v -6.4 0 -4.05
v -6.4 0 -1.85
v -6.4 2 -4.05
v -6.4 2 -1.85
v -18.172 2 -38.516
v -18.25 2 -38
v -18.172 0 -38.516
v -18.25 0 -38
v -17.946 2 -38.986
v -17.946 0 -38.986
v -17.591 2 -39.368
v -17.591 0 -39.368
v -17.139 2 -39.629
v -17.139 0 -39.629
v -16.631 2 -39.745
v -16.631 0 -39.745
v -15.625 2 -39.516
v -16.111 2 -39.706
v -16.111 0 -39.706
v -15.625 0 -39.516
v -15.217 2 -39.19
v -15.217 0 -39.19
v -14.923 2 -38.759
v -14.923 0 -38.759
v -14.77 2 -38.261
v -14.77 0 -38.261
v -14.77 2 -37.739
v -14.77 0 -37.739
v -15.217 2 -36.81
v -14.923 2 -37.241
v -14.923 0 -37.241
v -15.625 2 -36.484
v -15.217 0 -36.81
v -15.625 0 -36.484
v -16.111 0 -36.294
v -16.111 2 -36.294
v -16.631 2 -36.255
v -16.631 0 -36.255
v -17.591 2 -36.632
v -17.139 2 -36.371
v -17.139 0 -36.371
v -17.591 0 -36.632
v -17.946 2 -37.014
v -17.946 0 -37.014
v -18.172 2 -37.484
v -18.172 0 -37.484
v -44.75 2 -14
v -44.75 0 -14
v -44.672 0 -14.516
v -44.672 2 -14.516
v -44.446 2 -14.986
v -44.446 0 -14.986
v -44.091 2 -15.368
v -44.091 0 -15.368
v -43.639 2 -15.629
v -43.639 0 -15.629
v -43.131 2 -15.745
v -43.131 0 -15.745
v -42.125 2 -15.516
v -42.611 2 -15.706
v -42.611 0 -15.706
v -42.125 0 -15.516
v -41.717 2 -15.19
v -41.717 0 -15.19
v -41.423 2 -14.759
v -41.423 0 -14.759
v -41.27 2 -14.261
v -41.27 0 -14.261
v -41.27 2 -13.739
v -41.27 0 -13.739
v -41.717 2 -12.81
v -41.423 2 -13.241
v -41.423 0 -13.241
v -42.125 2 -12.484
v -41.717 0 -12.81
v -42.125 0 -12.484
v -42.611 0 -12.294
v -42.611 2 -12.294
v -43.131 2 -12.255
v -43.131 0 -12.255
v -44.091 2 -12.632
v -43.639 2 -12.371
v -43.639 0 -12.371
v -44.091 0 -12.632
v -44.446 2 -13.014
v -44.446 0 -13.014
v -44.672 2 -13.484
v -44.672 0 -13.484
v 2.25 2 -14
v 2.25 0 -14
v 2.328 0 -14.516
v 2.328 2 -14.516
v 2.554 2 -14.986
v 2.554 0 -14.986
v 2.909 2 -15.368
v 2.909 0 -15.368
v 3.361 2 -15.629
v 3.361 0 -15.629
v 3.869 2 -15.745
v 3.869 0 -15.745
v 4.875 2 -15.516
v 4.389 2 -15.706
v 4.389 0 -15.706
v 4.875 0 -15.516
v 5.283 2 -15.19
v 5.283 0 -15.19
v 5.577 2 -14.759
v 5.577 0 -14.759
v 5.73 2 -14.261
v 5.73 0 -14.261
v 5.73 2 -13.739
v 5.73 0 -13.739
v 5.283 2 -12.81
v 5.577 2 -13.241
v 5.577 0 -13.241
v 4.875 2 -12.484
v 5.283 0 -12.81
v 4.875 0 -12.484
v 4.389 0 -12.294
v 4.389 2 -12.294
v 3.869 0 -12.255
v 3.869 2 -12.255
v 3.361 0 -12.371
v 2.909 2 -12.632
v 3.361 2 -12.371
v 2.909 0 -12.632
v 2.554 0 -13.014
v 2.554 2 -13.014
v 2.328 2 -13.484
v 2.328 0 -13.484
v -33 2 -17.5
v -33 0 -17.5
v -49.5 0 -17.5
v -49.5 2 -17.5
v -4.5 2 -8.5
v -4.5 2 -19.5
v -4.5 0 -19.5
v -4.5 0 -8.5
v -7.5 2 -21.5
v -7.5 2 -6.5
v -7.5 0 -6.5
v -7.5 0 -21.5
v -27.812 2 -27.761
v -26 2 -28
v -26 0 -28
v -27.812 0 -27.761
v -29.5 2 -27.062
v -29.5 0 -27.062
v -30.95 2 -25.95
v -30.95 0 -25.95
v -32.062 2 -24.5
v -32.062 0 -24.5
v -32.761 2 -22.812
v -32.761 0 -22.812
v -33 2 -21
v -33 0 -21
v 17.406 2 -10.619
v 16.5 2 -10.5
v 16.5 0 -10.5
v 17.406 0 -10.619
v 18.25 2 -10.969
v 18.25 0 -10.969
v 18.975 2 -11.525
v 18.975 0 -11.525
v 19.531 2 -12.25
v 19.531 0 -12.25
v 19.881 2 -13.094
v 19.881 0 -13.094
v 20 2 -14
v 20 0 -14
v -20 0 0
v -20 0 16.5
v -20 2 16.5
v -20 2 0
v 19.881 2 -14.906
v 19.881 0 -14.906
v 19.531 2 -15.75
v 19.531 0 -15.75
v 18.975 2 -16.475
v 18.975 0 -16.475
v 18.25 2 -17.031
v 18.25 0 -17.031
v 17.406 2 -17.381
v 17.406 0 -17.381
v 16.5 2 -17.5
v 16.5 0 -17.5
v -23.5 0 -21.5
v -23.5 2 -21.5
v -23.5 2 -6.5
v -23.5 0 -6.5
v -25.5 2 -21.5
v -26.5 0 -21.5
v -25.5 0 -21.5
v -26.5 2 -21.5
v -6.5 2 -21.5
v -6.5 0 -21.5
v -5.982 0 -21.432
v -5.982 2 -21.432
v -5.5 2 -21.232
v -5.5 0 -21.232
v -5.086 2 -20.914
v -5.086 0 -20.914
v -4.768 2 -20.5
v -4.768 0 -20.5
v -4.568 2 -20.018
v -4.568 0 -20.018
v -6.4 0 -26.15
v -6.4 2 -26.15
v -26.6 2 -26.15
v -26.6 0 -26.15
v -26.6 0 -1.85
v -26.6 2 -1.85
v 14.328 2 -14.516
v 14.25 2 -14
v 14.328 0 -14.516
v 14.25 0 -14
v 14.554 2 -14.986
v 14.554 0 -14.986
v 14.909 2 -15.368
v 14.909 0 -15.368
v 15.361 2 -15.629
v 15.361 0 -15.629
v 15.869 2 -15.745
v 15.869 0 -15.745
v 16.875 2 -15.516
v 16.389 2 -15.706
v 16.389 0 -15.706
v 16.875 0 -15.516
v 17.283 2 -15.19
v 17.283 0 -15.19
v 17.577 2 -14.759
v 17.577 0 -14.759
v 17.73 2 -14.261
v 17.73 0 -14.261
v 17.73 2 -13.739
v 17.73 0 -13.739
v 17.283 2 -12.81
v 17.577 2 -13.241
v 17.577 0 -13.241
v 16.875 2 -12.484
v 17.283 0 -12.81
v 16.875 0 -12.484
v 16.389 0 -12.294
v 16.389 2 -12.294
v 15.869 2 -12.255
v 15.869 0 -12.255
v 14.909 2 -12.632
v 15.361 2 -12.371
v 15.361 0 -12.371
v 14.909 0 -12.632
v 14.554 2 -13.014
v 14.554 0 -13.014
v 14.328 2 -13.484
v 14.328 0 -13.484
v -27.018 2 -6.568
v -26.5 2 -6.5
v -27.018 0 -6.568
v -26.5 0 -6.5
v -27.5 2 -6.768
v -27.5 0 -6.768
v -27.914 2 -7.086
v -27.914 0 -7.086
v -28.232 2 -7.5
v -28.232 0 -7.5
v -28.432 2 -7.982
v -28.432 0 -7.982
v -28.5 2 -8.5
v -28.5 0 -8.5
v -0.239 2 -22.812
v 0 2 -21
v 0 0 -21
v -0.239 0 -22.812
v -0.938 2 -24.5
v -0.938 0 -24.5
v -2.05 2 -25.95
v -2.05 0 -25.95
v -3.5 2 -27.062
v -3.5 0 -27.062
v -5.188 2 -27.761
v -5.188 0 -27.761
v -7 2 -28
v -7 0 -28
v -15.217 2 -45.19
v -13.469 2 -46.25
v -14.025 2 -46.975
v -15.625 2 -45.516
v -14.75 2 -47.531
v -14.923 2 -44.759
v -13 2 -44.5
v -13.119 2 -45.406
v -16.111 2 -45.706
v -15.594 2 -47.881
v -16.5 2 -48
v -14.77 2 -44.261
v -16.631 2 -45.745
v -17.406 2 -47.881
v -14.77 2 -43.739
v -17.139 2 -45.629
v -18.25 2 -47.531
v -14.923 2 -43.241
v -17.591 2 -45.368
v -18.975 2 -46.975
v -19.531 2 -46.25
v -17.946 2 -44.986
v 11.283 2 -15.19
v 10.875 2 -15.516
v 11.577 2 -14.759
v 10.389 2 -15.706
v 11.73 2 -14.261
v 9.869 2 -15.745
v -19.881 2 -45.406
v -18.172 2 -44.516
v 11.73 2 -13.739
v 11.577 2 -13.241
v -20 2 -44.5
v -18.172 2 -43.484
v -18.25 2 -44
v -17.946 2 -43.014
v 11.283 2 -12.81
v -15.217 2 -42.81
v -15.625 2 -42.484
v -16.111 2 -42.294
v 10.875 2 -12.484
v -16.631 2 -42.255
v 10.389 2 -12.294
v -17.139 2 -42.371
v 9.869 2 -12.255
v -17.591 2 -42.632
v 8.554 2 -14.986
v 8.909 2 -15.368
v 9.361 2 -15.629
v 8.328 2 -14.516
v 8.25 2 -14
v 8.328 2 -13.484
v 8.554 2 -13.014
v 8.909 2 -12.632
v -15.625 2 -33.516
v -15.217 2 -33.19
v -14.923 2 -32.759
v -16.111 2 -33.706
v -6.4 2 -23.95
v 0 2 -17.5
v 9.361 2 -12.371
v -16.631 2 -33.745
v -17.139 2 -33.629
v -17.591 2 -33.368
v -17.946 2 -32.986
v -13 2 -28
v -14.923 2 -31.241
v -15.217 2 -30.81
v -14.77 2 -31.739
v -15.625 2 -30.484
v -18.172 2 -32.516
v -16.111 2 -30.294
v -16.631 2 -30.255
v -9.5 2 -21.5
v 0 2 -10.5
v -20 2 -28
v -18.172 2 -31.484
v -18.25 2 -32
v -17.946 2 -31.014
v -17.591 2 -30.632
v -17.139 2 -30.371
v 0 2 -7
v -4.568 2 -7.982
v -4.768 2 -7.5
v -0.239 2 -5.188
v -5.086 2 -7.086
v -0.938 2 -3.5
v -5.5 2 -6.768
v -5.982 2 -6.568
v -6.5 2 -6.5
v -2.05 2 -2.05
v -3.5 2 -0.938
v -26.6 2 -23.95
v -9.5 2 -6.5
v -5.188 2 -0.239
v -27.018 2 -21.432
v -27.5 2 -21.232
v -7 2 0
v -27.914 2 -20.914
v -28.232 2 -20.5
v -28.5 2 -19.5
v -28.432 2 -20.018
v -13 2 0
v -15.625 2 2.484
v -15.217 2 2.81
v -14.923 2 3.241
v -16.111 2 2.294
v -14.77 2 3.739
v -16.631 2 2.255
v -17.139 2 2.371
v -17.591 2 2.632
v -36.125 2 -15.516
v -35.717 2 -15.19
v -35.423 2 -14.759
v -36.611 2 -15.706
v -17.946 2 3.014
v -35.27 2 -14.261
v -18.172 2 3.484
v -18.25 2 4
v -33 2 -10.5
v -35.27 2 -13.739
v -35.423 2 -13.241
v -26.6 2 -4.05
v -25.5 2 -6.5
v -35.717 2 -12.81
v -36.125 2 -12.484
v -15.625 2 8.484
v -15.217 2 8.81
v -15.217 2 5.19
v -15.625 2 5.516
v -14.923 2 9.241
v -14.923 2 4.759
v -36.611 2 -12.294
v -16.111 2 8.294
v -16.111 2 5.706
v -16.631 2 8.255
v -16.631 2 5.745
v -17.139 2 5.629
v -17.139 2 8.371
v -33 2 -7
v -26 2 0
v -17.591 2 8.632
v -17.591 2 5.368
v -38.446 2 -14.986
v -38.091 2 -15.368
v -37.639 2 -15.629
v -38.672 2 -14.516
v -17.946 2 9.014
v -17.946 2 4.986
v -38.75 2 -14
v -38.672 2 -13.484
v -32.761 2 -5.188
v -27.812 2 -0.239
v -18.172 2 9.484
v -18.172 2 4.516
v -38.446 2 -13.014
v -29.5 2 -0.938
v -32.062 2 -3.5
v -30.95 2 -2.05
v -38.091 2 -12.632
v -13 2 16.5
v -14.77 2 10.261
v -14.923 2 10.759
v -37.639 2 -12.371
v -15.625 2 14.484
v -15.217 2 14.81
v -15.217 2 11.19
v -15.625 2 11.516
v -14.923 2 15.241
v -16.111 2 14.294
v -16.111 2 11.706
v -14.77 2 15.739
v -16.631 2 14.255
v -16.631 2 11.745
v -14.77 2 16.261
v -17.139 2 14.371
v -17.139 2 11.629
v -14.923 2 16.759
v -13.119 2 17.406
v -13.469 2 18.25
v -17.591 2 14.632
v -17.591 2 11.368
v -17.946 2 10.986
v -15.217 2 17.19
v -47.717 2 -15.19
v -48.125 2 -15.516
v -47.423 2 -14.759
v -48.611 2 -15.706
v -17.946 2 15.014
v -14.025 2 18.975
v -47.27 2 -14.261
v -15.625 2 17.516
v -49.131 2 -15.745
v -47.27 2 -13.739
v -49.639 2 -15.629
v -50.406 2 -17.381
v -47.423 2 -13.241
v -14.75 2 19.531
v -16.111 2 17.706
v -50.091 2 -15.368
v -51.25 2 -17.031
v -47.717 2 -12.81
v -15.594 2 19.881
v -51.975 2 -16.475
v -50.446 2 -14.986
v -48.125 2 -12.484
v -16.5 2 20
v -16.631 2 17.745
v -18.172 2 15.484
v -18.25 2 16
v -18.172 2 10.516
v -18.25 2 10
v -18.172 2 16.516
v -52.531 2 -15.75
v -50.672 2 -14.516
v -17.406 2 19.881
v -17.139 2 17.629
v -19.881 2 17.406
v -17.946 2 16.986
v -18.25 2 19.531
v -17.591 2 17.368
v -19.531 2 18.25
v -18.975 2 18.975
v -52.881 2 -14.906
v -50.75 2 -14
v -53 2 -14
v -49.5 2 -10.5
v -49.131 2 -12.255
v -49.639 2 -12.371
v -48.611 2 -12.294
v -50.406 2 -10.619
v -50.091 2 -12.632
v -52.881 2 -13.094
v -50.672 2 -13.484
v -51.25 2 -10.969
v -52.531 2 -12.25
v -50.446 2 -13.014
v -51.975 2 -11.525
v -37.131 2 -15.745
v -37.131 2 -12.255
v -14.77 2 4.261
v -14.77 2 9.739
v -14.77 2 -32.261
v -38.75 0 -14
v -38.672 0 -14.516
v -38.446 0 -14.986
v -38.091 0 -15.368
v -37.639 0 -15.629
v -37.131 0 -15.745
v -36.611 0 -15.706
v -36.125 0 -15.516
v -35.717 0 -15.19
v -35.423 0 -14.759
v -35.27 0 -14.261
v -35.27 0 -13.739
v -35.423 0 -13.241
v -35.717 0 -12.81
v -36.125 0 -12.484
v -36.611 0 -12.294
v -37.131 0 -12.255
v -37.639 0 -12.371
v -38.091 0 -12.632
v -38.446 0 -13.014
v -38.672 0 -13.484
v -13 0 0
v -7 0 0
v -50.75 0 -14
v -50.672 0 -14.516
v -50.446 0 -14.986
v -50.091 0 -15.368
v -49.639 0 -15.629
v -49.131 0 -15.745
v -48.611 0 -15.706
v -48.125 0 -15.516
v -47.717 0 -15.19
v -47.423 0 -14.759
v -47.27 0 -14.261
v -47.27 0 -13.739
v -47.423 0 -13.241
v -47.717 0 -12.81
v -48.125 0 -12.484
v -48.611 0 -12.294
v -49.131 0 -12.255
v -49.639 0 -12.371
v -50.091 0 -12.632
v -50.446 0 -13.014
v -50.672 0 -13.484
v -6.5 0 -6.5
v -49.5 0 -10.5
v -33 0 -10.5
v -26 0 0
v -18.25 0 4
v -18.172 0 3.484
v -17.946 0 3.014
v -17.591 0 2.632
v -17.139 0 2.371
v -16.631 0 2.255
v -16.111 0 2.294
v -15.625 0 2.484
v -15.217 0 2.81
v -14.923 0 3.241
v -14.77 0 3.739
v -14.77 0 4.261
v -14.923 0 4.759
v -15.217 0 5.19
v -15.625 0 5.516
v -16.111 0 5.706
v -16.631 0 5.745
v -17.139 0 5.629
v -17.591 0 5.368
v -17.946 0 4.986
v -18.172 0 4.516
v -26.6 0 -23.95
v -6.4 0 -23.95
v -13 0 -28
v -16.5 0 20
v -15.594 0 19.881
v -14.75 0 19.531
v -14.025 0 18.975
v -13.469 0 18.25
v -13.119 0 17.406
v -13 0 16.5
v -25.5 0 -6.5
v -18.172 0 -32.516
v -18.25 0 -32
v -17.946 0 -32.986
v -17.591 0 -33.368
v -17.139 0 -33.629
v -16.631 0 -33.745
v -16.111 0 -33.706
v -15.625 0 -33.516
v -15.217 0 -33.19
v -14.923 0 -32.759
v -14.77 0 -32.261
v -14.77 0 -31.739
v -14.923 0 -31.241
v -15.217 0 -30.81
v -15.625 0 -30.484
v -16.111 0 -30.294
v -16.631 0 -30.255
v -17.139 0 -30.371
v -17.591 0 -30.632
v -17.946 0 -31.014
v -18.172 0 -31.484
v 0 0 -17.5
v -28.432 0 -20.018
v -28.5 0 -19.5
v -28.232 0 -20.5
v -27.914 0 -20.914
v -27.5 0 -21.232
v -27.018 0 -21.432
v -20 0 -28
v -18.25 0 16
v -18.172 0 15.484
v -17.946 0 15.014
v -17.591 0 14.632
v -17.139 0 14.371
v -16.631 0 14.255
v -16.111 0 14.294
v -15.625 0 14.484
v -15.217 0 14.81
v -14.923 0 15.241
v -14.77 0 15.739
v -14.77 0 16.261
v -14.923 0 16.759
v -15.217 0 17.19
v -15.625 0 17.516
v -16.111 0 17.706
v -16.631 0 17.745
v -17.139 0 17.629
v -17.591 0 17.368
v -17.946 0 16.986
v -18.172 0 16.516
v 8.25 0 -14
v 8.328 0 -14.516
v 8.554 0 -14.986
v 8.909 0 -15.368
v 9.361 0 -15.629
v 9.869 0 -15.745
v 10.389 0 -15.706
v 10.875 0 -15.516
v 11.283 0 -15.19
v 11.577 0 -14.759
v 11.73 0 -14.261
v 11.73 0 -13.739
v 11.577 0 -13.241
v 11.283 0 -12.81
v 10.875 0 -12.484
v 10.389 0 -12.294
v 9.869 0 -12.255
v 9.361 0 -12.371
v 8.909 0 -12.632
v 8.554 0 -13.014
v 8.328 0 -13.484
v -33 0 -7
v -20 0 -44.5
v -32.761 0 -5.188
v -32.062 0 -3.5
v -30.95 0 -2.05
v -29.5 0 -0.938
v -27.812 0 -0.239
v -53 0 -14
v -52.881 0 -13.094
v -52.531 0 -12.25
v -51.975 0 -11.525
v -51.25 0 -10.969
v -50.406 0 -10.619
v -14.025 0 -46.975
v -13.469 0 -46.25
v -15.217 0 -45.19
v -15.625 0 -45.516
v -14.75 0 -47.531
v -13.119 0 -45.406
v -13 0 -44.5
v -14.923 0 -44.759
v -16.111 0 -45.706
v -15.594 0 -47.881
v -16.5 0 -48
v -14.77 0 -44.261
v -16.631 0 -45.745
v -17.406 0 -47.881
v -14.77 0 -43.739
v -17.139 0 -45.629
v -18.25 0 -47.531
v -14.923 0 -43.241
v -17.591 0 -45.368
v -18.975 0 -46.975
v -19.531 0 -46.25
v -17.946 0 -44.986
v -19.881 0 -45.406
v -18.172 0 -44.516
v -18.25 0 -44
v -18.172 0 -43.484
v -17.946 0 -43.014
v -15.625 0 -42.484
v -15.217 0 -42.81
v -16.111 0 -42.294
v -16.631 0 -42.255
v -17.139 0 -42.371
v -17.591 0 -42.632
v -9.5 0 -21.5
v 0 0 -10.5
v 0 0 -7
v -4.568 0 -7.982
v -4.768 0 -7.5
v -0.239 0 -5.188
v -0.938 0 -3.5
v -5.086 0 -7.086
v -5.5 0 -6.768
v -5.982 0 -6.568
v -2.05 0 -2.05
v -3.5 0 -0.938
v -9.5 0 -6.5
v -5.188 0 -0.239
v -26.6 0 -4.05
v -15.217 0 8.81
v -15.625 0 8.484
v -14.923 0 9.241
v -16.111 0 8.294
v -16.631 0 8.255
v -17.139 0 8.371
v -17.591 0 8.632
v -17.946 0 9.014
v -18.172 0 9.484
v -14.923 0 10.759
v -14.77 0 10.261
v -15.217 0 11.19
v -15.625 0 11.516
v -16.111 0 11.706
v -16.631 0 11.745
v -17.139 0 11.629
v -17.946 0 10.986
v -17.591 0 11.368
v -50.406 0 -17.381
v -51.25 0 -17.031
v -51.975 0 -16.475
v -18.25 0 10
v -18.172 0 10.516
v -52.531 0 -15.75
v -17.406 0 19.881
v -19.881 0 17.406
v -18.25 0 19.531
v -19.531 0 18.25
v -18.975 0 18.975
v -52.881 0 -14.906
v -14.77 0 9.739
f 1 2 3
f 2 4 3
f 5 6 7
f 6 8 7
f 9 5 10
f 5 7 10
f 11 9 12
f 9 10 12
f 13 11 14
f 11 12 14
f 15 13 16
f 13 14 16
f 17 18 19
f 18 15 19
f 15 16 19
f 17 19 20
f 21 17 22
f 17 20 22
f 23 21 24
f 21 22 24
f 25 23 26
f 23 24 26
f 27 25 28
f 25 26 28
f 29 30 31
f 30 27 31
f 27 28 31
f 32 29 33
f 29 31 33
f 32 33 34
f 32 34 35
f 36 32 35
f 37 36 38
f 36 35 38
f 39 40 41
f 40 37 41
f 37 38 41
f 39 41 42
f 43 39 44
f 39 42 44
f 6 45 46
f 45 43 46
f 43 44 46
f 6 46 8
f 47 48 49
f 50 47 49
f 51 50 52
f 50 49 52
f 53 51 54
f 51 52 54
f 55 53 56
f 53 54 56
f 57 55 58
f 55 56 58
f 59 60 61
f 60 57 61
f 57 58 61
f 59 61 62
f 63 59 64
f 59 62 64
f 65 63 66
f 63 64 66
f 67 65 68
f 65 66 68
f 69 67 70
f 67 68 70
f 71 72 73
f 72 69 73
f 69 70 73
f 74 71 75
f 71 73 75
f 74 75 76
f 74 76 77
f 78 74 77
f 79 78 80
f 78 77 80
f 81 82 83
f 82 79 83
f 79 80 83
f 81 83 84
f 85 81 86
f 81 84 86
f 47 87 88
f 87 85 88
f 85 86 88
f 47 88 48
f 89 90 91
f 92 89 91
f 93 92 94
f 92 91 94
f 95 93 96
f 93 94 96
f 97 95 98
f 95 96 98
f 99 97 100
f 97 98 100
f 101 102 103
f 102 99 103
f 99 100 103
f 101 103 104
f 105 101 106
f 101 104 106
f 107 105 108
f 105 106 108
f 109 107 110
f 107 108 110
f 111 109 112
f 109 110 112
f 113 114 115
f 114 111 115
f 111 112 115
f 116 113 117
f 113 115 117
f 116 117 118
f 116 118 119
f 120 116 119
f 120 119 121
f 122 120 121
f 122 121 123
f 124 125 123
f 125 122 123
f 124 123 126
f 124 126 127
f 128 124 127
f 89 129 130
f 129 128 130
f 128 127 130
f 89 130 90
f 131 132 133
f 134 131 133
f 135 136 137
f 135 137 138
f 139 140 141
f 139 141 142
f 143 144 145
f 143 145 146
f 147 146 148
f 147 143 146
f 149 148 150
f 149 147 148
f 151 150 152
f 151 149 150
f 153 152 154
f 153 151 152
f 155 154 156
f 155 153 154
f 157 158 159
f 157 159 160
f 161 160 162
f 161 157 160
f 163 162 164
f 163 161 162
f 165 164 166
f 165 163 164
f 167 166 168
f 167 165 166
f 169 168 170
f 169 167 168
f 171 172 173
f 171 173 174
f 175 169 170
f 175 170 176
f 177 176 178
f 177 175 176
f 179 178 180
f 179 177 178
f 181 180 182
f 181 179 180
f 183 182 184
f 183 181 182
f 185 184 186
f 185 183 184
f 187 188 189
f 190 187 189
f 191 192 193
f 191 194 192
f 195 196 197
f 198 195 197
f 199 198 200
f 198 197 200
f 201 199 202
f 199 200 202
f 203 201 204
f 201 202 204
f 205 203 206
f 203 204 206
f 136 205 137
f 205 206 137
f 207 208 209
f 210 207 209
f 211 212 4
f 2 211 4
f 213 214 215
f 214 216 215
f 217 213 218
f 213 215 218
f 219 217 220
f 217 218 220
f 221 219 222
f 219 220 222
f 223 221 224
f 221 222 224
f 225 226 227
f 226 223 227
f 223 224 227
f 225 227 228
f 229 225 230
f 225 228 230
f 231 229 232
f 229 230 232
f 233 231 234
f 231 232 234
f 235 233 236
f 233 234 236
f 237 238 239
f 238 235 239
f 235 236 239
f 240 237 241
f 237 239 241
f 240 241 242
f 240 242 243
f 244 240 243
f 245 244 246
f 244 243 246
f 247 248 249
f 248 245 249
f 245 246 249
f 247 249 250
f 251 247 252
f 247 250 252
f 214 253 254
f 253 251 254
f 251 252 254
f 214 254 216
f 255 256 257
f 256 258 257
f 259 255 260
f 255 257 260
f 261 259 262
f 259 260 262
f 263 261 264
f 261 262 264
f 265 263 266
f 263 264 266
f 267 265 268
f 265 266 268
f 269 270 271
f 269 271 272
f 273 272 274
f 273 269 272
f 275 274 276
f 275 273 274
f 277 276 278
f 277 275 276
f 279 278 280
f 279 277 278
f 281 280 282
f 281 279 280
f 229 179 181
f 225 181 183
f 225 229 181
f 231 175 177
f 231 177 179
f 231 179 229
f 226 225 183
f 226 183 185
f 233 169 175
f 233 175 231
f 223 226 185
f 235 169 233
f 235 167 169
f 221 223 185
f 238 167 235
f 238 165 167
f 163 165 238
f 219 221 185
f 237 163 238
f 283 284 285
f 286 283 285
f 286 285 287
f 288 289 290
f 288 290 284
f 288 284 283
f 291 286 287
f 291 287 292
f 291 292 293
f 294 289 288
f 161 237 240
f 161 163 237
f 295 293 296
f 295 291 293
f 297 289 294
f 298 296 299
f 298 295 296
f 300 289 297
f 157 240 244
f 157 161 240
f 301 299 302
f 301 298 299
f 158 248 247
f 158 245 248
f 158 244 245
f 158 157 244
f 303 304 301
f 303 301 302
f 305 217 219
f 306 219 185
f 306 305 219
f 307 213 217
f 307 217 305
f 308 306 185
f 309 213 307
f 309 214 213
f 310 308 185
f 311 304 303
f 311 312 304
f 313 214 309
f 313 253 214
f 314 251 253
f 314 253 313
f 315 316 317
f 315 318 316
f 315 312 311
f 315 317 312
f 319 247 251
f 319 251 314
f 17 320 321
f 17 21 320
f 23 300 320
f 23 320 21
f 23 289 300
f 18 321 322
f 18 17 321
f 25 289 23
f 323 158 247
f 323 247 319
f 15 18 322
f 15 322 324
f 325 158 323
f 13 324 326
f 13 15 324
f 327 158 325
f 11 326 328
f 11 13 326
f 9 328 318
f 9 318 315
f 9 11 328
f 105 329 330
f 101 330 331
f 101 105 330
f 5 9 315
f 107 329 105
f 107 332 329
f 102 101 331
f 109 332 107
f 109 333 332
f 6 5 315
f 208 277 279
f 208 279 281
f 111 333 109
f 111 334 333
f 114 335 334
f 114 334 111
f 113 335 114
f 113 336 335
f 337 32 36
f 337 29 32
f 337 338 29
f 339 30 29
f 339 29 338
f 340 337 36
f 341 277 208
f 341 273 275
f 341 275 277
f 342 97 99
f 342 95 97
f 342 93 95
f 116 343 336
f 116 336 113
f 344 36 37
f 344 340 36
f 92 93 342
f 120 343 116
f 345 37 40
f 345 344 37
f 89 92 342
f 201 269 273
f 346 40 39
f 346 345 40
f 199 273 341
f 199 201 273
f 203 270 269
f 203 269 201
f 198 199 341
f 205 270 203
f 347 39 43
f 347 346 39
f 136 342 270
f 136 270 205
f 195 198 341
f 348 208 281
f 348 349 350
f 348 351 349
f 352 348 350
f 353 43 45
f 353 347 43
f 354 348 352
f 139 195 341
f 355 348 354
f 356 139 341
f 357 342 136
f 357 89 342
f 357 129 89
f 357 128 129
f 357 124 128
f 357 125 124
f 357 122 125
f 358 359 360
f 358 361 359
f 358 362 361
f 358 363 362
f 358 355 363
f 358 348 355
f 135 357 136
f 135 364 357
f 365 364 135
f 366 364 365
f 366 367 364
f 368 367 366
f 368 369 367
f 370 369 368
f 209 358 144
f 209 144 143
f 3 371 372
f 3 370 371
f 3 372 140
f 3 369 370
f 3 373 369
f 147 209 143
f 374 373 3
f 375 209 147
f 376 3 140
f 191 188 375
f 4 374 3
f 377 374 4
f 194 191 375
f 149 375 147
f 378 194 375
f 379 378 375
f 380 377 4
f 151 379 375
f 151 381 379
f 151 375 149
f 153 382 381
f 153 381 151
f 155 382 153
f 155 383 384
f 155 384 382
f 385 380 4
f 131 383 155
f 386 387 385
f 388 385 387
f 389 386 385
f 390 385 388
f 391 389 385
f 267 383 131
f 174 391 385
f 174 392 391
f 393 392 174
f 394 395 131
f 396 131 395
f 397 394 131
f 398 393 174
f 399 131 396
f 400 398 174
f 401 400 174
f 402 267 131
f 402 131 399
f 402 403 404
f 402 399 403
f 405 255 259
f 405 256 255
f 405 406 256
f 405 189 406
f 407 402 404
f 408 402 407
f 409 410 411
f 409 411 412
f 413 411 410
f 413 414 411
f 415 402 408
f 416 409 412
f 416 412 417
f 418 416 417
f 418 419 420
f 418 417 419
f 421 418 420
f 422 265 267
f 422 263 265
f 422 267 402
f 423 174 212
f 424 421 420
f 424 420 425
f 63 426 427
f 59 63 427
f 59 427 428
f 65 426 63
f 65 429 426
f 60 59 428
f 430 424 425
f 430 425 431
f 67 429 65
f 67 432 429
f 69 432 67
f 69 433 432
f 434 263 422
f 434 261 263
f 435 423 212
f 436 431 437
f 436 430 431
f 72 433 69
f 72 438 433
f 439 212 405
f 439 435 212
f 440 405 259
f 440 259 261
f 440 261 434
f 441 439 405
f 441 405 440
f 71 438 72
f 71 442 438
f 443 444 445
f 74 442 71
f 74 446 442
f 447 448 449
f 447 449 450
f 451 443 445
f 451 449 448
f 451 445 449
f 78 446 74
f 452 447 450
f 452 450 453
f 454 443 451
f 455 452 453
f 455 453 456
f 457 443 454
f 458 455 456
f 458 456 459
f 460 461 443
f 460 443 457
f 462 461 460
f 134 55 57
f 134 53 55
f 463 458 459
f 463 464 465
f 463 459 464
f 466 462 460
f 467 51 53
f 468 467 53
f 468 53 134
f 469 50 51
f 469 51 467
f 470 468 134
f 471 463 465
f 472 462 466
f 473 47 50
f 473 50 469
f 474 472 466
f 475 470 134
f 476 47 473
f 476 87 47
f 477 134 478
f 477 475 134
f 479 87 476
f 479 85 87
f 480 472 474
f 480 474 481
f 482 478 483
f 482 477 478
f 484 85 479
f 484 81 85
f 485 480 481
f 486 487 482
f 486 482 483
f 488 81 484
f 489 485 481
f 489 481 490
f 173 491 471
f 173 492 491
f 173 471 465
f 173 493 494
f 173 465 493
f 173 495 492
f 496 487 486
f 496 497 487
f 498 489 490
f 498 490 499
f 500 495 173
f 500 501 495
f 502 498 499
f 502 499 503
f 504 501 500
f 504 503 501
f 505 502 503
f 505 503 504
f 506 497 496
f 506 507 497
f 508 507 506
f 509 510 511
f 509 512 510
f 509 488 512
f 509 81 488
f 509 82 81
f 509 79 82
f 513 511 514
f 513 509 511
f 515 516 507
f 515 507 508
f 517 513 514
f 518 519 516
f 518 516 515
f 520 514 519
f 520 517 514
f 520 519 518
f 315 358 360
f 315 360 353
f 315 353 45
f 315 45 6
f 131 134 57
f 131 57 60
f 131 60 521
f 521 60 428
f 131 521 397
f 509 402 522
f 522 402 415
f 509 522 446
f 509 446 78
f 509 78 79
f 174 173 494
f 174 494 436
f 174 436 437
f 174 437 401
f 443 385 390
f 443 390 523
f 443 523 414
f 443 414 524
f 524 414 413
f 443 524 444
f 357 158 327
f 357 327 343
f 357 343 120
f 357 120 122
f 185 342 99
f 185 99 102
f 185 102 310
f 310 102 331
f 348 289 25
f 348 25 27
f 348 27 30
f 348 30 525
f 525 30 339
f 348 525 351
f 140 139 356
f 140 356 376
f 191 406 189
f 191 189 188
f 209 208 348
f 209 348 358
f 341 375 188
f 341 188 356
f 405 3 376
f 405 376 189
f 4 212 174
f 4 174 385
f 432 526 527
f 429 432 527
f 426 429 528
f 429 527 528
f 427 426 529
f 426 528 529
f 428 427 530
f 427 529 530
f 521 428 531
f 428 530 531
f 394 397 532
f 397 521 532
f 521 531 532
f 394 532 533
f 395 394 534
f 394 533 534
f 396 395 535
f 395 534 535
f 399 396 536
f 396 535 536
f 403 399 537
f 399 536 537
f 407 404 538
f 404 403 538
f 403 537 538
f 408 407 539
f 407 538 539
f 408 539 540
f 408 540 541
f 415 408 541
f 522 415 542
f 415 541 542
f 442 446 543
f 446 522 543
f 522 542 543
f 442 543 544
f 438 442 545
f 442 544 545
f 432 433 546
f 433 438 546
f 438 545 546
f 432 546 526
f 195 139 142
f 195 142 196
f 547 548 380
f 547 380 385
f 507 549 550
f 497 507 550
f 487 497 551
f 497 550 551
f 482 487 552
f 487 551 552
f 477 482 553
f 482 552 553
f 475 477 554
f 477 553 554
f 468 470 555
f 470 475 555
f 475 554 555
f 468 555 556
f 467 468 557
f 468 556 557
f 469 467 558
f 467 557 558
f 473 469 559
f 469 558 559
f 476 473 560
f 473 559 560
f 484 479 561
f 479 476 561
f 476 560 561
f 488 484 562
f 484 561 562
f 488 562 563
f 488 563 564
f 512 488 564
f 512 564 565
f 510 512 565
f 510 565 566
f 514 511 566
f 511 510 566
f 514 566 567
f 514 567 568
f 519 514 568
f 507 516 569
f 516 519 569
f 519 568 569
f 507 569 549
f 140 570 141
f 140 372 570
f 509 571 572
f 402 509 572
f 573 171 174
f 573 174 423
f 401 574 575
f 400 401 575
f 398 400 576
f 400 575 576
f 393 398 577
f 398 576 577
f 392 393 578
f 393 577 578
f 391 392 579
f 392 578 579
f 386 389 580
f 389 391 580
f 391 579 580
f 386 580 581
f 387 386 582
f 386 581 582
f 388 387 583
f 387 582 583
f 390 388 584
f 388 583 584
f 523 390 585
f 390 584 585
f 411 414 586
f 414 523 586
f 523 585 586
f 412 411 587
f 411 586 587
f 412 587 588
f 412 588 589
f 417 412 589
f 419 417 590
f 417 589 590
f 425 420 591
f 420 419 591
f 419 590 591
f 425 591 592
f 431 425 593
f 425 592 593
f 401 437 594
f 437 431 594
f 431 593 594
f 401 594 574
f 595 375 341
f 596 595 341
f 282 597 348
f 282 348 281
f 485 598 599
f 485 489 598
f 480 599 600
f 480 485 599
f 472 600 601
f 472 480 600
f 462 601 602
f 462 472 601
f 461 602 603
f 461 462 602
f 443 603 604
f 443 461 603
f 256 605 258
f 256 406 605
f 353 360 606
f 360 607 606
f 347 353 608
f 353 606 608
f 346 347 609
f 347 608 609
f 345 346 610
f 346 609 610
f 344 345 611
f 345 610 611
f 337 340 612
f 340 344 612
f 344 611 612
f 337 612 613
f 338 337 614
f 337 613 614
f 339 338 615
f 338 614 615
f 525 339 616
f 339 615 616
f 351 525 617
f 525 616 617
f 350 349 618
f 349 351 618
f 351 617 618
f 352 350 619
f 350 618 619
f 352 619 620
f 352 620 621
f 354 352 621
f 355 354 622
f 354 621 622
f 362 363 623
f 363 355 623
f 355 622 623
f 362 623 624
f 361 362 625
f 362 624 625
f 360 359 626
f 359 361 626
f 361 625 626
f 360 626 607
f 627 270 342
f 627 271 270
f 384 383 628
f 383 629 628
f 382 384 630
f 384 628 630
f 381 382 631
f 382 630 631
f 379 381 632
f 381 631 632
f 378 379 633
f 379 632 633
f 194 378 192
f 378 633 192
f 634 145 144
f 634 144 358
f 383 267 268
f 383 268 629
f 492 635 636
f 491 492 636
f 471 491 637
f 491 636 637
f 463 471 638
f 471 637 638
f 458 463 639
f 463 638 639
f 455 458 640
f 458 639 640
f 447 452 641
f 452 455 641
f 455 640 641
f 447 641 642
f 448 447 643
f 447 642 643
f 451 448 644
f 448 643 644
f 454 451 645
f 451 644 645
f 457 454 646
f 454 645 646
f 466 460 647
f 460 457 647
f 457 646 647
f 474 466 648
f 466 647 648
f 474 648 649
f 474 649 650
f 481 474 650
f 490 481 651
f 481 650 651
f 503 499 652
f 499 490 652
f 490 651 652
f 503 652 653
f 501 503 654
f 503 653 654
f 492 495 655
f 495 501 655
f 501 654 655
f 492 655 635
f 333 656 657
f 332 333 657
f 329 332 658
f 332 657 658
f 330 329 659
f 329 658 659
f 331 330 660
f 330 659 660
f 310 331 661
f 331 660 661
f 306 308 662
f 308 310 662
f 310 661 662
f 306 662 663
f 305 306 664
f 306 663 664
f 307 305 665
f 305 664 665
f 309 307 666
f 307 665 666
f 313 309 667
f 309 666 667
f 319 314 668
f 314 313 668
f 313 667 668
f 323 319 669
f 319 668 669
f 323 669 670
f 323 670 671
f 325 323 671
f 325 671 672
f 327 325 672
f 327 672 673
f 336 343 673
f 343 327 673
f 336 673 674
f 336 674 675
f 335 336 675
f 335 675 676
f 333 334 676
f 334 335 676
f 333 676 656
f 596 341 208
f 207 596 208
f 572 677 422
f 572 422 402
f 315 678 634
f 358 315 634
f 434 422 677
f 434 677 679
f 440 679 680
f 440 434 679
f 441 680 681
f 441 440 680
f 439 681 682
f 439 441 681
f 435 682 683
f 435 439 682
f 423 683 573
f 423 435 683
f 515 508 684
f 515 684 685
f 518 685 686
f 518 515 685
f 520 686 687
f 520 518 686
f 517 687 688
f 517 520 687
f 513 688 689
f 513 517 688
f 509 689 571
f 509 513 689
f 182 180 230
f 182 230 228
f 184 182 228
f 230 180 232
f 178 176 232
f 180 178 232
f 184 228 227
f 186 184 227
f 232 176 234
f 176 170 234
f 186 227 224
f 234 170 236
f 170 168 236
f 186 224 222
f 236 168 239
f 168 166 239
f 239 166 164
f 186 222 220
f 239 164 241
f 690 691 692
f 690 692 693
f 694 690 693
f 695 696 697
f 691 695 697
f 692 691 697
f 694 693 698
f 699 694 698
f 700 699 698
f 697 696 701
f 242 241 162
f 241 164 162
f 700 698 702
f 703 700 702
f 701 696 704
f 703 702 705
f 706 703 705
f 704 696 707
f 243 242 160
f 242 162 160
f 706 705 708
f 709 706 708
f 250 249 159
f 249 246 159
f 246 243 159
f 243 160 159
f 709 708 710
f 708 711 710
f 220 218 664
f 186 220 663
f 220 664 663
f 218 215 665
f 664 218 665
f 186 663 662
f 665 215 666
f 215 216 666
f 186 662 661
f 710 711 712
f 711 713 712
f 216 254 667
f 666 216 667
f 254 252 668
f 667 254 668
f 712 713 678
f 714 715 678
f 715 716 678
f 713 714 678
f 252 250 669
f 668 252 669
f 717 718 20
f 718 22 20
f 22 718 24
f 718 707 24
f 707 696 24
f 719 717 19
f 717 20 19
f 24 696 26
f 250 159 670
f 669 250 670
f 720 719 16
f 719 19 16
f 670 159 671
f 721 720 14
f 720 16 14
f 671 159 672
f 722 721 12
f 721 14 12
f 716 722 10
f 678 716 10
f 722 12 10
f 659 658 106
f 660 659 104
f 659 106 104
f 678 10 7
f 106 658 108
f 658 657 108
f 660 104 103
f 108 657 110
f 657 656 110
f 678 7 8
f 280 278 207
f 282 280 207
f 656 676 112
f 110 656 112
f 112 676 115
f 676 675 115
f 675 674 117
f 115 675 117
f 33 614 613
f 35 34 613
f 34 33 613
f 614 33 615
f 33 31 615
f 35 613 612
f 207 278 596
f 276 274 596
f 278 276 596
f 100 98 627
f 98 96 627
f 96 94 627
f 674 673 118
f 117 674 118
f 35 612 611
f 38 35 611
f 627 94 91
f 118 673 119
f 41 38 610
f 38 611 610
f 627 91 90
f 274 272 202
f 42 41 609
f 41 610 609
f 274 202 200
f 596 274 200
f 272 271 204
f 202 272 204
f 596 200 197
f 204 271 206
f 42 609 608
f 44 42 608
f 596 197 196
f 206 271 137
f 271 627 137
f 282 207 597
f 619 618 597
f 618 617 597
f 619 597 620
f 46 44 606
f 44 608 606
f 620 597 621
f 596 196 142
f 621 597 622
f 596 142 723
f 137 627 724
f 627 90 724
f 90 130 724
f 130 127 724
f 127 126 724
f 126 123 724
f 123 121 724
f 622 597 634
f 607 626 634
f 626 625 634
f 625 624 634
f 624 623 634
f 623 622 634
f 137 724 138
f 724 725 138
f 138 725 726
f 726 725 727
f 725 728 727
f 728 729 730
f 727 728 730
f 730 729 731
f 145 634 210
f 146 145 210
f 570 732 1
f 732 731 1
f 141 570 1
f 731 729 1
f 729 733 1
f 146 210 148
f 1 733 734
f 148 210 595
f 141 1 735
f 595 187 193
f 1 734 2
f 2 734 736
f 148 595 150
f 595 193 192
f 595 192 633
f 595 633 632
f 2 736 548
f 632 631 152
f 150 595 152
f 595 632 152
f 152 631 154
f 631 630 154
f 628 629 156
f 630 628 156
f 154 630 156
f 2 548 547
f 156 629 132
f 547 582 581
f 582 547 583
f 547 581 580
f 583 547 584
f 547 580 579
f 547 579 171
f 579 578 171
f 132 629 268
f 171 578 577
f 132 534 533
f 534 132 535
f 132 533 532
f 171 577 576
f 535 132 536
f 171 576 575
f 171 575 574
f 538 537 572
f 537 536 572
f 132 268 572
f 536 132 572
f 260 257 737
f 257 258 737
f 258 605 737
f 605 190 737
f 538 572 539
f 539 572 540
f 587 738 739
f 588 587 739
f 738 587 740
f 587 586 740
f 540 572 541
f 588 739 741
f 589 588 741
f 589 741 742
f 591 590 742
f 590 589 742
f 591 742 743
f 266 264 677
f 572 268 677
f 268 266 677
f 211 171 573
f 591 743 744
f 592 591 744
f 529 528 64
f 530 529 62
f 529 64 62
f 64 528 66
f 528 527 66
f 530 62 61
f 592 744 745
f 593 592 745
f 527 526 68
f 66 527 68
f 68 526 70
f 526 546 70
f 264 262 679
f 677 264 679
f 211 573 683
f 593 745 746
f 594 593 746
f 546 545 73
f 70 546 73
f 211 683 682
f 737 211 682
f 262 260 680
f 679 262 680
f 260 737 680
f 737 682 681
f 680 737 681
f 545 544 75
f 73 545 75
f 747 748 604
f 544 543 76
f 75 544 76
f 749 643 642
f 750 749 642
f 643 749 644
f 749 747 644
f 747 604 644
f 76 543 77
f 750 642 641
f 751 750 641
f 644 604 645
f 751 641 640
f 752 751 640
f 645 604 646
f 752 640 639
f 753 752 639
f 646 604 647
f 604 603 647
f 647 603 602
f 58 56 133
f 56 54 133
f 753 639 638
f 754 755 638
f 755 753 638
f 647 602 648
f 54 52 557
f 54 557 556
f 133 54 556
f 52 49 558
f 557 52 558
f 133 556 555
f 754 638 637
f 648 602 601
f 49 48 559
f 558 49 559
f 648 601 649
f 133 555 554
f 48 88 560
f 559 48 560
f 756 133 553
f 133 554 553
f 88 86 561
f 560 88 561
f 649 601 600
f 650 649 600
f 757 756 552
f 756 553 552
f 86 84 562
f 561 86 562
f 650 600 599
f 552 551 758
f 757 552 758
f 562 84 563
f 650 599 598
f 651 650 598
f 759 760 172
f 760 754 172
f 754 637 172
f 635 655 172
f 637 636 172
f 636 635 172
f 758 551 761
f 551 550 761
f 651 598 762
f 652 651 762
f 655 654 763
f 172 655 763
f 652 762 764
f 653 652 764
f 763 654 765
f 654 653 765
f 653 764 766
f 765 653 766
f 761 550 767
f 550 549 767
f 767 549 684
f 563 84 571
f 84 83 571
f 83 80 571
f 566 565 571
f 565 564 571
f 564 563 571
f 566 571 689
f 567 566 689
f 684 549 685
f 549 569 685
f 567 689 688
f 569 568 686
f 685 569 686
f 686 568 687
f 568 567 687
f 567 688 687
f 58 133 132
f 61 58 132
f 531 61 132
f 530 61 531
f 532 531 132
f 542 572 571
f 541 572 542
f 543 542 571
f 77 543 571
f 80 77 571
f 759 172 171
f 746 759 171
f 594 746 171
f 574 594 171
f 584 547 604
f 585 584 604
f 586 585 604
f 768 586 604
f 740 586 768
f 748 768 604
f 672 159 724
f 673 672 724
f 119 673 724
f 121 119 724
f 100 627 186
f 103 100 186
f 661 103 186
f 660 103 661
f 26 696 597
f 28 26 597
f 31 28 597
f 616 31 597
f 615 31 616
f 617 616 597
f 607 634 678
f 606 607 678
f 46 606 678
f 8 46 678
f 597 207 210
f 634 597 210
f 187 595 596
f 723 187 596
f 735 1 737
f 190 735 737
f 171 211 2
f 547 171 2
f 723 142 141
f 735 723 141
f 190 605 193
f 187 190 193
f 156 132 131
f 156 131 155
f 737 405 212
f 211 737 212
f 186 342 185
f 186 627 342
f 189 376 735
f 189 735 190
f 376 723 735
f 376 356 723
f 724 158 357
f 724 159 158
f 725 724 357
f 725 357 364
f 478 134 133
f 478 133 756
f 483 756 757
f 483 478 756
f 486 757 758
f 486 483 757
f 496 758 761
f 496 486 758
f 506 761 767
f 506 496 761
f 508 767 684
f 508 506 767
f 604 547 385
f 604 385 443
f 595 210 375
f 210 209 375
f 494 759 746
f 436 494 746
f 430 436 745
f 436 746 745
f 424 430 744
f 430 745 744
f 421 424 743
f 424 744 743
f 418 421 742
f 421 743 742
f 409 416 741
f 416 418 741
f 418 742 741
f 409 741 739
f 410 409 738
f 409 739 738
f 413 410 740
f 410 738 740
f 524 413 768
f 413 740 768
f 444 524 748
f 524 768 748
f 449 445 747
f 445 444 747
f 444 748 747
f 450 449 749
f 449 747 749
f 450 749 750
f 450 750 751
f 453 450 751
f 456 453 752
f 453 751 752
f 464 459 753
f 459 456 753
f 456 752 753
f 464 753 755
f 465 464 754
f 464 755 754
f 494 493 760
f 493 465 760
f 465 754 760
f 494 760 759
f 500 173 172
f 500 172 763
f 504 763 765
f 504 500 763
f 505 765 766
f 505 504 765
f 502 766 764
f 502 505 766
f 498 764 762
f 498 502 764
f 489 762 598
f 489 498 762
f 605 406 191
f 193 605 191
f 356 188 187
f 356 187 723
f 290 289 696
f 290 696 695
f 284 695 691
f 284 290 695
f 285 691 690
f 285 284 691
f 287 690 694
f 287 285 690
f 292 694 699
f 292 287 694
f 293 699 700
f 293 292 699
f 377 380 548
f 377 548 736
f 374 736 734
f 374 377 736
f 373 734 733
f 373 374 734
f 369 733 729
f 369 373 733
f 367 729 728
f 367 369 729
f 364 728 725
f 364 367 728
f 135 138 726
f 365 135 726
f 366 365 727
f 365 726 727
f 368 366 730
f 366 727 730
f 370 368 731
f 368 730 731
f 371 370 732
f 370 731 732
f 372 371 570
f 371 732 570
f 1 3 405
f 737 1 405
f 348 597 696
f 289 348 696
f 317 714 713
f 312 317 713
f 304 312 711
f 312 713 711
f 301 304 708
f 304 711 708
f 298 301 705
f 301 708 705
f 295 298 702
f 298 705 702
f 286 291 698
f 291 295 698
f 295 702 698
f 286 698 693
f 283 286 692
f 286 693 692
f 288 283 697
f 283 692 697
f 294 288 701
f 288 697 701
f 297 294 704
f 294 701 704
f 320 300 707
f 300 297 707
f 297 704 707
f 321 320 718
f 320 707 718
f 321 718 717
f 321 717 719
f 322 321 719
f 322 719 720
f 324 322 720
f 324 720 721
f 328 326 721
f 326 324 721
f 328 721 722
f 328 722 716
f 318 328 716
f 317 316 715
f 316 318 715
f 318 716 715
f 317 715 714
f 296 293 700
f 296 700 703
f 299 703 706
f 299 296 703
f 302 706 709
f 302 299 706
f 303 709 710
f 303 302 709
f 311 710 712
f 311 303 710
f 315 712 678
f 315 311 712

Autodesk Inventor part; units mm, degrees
ref_plane "YZ Plane" through (0, 0, 0) normal (1, 0, 0) x (0, 1, 0)
ref_plane "XZ Plane" through (0, 0, 0) normal (0, 1, 0) x (-1, 0, 0)
ref_plane "XY Plane" through (0, 0, 0) normal (0, 0, 1) x (1, 0, 0)
sketch "Sketch1" plane through (0, 0, 0) normal (0, 1, 0) x (-1, 0, 0)
  line L0 (0, 0) -> (33, 0)
  line L1 (33, 0) -> (33, -28)
  line L2 (33, -28) -> (0, -28)
  line L3 (0, -28) -> (0, 0)
  line L4 (0, -17.5) -> (-20, -17.5)
  line L5 (-20, -17.5) -> (-20, -10.5)
  line L6 (-20, -10.5) -> (0, -10.5)
  line L7 (0, -10.5) -> (0, -17.5)
  line L8 (33, -17.5) -> (53, -17.5)
  line L9 (53, -17.5) -> (53, -10.5)
  line L10 (53, -10.5) -> (33, -10.5)
  line L11 (33, -10.5) -> (33, -17.5)
  line L12 (20, -28) -> (13, -28)
  line L13 (13, -28) -> (13, -48)
  line L14 (13, -48) -> (20, -48)
  line L15 (20, -48) -> (20, -28)
  line L16 (20, 0) -> (13, 0)
  line L17 (13, 0) -> (13, 20)
  line L18 (13, 20) -> (20, 20)
  line L19 (20, 20) -> (20, 0)
  circle A0 centre (16.5, -44) radius 1.75
  circle A1 centre (-16, -14) radius 1.75
  circle A2 centre (16.5, 16) radius 1.75
  circle A3 centre (49, -14) radius 1.75
  line L20 (16.5, -44) -> (16.5, -48) construction
  line L21 (-16, -14) -> (-20, -14) construction
  line L22 (16.5, 16) -> (16.5, 20) construction
  line L23 (49, -14) -> (53, -14) construction
  circle A4 centre (43, -14) radius 1.75
  circle A5 centre (37, -14) radius 1.75
  circle A6 centre (16.5, -38) radius 1.75
  circle A7 centre (16.5, -32) radius 1.75
  circle A8 centre (-10, -14) radius 1.75
  circle A9 centre (-4, -14) radius 1.75
  circle A10 centre (16.5, 10) radius 1.75
  circle A11 centre (16.5, 4) radius 1.75
  point P0 (16.5, -28)
  point P1 (16.5, 0)
  point P2 (0, -14)
  point P3 (33, -14)
  dimension "d0" = 33
  dimension "d1" = 28
  dimension "d29" = 7
  dimension "d34" = 20
  dimension "d35" = 4
  dimension "d36" = 3.5
  dimension "d44" = 6
  dimension "d51" = 6
  dimension "d58" = 6
  dimension "d65" = 6
extrude "Extrusion1" add sketch "Sketch1" along normal blind 2
sketch "Sketch2" plane through (0, 2, 0) normal (0, 1, 0) x (1, 0, 0)
  line L0 (0, 28) -> (-13, 28) projected
  line L1 (-33, 28) -> (-33, 17.5) projected
  line L2 (-33, 0) -> (-20, 0) projected
  line L3 (0, 0) -> (0, 10.5) projected
  line L4 (-26.6, 1.85) -> (-6.4, 1.85)
  line L5 (-6.4, 1.85) -> (-6.4, 4.05)
  line L6 (-6.4, 4.05) -> (-26.6, 4.05)
  line L7 (-26.6, 4.05) -> (-26.6, 1.85)
  line L8 (-26.6, 23.95) -> (-6.4, 23.95)
  line L9 (-6.4, 23.95) -> (-6.4, 26.15)
  line L10 (-6.4, 26.15) -> (-26.6, 26.15)
  line L11 (-26.6, 26.15) -> (-26.6, 23.95)
  line L12 (-26.6, 1.85) -> (-33, 1.85)
  line L13 (-26.6, 1.85) -> (-26.6, 0)
  line L14 (-26.6, 26.15) -> (-26.6, 28)
  line L15 (-6.4, 4.05) -> (0, 4.05)
  line L16 (-13, 28) -> (-13, 48) projected
  line L17 (-13, 48) -> (-20, 48) projected
  line L18 (-20, 48) -> (-20, 28) projected
  line L19 (-20, 28) -> (-33, 28) projected
  line L20 (-33, 17.5) -> (-53, 17.5) projected
  line L21 (-53, 17.5) -> (-53, 10.5) projected
  line L22 (-53, 10.5) -> (-33, 10.5) projected
  line L23 (-33, 10.5) -> (-33, 0) projected
  line L24 (-20, 0) -> (-20, -20) projected
  line L25 (-20, -20) -> (-13, -20) projected
  line L26 (-13, -20) -> (-13, 0) projected
  line L27 (-13, 0) -> (0, 0) projected
  line L28 (0, 10.5) -> (20, 10.5) projected
  line L29 (20, 10.5) -> (20, 17.5) projected
  line L30 (20, 17.5) -> (0, 17.5) projected
  line L31 (0, 17.5) -> (0, 28) projected
  line L32 (-28.5, 21.5) -> (-4.5, 21.5)
  line L33 (-4.5, 21.5) -> (-4.5, 6.5)
  line L34 (-4.5, 6.5) -> (-28.5, 6.5)
  line L35 (-28.5, 6.5) -> (-28.5, 21.5)
  line L36 (-28.5, 21.5) -> (-4.5, 6.5) construction
  line L37 (-4.5, 21.5) -> (-28.5, 6.5) construction
  point P0 (-16.5, 14)
  point P1 (-16.5, 23.95)
  point P2 (20, 14)
  dimension "d4" = 2.2
  dimension "d5" = 20.2
  dimension "d6" = 19.9
  dimension "d37" = 24
  dimension "d38" = 15
extrude "Extrusion2" cut sketch "Sketch2" against normal through all contours L10 L9 L8 L11 | L5 L4 L7 L6 | L32 L33 L34 L35
fillet "Fillet1" radius 3.5 8 edges at (-20, 1, 20) (-13, 1, 20) (20, 1, -10.5) (20, 1, -17.5) (-13, 1, -48) (-20, 1, -48) (-53, 1, -17.5) (-53, 1, -10.5)
fillet "Fillet2" radius 7 4 edges at (-33, 1, 0) (-33, 1, -28) (0, 1, -28) (0, 1, 0)
fillet "Fillet3" radius 2 4 edges at (-28.5, 1, -21.5) (-4.5, 1, -21.5) (-28.5, 1, -6.5) (-4.5, 1, -6.5)
sketch "Sketch4" plane through (0, 2, 0) normal (0, 1, 0) x (1, 0, 0)
  arc A0 (-4.5, 19.5) -> (-6.5, 21.5) centre (-6.5, 19.5) ccw construction
  line L0 (-26.5, 21.5) -> (-6.5, 21.5) construction
  line L1 (-4.5, 19.5) -> (-4.5, 8.5) construction
  arc A1 (-6.5, 6.5) -> (-4.5, 8.5) centre (-6.5, 8.5) ccw construction
  line L2 (-6.5, 6.5) -> (-26.5, 6.5) construction
  arc A2 (-28.5, 8.5) -> (-26.5, 6.5) centre (-26.5, 8.5) ccw construction
  line L3 (-28.5, 8.5) -> (-28.5, 19.5) construction
  arc A3 (-26.5, 21.5) -> (-28.5, 19.5) centre (-26.5, 19.5) ccw construction
  line L4 (-25.5, 21.5) -> (-23.5, 21.5)
  line L5 (-23.5, 21.5) -> (-23.5, 6.5)
  line L6 (-23.5, 6.5) -> (-25.5, 6.5)
  line L7 (-25.5, 6.5) -> (-25.5, 21.5)
  line L8 (-9.5, 6.5) -> (-7.5, 6.5)
  line L9 (-7.5, 6.5) -> (-7.5, 21.5)
  line L10 (-7.5, 21.5) -> (-9.5, 21.5)
  line L11 (-9.5, 21.5) -> (-9.5, 6.5)
  point P0 (0, 0)
  dimension "d70" = 3
  dimension "d71" = 3
  dimension "d72" = 2
extrude "Extrusion4" add sketch "Sketch4" against normal up to surface (2 mm away)
properties part number "SoporteMarkers12"
